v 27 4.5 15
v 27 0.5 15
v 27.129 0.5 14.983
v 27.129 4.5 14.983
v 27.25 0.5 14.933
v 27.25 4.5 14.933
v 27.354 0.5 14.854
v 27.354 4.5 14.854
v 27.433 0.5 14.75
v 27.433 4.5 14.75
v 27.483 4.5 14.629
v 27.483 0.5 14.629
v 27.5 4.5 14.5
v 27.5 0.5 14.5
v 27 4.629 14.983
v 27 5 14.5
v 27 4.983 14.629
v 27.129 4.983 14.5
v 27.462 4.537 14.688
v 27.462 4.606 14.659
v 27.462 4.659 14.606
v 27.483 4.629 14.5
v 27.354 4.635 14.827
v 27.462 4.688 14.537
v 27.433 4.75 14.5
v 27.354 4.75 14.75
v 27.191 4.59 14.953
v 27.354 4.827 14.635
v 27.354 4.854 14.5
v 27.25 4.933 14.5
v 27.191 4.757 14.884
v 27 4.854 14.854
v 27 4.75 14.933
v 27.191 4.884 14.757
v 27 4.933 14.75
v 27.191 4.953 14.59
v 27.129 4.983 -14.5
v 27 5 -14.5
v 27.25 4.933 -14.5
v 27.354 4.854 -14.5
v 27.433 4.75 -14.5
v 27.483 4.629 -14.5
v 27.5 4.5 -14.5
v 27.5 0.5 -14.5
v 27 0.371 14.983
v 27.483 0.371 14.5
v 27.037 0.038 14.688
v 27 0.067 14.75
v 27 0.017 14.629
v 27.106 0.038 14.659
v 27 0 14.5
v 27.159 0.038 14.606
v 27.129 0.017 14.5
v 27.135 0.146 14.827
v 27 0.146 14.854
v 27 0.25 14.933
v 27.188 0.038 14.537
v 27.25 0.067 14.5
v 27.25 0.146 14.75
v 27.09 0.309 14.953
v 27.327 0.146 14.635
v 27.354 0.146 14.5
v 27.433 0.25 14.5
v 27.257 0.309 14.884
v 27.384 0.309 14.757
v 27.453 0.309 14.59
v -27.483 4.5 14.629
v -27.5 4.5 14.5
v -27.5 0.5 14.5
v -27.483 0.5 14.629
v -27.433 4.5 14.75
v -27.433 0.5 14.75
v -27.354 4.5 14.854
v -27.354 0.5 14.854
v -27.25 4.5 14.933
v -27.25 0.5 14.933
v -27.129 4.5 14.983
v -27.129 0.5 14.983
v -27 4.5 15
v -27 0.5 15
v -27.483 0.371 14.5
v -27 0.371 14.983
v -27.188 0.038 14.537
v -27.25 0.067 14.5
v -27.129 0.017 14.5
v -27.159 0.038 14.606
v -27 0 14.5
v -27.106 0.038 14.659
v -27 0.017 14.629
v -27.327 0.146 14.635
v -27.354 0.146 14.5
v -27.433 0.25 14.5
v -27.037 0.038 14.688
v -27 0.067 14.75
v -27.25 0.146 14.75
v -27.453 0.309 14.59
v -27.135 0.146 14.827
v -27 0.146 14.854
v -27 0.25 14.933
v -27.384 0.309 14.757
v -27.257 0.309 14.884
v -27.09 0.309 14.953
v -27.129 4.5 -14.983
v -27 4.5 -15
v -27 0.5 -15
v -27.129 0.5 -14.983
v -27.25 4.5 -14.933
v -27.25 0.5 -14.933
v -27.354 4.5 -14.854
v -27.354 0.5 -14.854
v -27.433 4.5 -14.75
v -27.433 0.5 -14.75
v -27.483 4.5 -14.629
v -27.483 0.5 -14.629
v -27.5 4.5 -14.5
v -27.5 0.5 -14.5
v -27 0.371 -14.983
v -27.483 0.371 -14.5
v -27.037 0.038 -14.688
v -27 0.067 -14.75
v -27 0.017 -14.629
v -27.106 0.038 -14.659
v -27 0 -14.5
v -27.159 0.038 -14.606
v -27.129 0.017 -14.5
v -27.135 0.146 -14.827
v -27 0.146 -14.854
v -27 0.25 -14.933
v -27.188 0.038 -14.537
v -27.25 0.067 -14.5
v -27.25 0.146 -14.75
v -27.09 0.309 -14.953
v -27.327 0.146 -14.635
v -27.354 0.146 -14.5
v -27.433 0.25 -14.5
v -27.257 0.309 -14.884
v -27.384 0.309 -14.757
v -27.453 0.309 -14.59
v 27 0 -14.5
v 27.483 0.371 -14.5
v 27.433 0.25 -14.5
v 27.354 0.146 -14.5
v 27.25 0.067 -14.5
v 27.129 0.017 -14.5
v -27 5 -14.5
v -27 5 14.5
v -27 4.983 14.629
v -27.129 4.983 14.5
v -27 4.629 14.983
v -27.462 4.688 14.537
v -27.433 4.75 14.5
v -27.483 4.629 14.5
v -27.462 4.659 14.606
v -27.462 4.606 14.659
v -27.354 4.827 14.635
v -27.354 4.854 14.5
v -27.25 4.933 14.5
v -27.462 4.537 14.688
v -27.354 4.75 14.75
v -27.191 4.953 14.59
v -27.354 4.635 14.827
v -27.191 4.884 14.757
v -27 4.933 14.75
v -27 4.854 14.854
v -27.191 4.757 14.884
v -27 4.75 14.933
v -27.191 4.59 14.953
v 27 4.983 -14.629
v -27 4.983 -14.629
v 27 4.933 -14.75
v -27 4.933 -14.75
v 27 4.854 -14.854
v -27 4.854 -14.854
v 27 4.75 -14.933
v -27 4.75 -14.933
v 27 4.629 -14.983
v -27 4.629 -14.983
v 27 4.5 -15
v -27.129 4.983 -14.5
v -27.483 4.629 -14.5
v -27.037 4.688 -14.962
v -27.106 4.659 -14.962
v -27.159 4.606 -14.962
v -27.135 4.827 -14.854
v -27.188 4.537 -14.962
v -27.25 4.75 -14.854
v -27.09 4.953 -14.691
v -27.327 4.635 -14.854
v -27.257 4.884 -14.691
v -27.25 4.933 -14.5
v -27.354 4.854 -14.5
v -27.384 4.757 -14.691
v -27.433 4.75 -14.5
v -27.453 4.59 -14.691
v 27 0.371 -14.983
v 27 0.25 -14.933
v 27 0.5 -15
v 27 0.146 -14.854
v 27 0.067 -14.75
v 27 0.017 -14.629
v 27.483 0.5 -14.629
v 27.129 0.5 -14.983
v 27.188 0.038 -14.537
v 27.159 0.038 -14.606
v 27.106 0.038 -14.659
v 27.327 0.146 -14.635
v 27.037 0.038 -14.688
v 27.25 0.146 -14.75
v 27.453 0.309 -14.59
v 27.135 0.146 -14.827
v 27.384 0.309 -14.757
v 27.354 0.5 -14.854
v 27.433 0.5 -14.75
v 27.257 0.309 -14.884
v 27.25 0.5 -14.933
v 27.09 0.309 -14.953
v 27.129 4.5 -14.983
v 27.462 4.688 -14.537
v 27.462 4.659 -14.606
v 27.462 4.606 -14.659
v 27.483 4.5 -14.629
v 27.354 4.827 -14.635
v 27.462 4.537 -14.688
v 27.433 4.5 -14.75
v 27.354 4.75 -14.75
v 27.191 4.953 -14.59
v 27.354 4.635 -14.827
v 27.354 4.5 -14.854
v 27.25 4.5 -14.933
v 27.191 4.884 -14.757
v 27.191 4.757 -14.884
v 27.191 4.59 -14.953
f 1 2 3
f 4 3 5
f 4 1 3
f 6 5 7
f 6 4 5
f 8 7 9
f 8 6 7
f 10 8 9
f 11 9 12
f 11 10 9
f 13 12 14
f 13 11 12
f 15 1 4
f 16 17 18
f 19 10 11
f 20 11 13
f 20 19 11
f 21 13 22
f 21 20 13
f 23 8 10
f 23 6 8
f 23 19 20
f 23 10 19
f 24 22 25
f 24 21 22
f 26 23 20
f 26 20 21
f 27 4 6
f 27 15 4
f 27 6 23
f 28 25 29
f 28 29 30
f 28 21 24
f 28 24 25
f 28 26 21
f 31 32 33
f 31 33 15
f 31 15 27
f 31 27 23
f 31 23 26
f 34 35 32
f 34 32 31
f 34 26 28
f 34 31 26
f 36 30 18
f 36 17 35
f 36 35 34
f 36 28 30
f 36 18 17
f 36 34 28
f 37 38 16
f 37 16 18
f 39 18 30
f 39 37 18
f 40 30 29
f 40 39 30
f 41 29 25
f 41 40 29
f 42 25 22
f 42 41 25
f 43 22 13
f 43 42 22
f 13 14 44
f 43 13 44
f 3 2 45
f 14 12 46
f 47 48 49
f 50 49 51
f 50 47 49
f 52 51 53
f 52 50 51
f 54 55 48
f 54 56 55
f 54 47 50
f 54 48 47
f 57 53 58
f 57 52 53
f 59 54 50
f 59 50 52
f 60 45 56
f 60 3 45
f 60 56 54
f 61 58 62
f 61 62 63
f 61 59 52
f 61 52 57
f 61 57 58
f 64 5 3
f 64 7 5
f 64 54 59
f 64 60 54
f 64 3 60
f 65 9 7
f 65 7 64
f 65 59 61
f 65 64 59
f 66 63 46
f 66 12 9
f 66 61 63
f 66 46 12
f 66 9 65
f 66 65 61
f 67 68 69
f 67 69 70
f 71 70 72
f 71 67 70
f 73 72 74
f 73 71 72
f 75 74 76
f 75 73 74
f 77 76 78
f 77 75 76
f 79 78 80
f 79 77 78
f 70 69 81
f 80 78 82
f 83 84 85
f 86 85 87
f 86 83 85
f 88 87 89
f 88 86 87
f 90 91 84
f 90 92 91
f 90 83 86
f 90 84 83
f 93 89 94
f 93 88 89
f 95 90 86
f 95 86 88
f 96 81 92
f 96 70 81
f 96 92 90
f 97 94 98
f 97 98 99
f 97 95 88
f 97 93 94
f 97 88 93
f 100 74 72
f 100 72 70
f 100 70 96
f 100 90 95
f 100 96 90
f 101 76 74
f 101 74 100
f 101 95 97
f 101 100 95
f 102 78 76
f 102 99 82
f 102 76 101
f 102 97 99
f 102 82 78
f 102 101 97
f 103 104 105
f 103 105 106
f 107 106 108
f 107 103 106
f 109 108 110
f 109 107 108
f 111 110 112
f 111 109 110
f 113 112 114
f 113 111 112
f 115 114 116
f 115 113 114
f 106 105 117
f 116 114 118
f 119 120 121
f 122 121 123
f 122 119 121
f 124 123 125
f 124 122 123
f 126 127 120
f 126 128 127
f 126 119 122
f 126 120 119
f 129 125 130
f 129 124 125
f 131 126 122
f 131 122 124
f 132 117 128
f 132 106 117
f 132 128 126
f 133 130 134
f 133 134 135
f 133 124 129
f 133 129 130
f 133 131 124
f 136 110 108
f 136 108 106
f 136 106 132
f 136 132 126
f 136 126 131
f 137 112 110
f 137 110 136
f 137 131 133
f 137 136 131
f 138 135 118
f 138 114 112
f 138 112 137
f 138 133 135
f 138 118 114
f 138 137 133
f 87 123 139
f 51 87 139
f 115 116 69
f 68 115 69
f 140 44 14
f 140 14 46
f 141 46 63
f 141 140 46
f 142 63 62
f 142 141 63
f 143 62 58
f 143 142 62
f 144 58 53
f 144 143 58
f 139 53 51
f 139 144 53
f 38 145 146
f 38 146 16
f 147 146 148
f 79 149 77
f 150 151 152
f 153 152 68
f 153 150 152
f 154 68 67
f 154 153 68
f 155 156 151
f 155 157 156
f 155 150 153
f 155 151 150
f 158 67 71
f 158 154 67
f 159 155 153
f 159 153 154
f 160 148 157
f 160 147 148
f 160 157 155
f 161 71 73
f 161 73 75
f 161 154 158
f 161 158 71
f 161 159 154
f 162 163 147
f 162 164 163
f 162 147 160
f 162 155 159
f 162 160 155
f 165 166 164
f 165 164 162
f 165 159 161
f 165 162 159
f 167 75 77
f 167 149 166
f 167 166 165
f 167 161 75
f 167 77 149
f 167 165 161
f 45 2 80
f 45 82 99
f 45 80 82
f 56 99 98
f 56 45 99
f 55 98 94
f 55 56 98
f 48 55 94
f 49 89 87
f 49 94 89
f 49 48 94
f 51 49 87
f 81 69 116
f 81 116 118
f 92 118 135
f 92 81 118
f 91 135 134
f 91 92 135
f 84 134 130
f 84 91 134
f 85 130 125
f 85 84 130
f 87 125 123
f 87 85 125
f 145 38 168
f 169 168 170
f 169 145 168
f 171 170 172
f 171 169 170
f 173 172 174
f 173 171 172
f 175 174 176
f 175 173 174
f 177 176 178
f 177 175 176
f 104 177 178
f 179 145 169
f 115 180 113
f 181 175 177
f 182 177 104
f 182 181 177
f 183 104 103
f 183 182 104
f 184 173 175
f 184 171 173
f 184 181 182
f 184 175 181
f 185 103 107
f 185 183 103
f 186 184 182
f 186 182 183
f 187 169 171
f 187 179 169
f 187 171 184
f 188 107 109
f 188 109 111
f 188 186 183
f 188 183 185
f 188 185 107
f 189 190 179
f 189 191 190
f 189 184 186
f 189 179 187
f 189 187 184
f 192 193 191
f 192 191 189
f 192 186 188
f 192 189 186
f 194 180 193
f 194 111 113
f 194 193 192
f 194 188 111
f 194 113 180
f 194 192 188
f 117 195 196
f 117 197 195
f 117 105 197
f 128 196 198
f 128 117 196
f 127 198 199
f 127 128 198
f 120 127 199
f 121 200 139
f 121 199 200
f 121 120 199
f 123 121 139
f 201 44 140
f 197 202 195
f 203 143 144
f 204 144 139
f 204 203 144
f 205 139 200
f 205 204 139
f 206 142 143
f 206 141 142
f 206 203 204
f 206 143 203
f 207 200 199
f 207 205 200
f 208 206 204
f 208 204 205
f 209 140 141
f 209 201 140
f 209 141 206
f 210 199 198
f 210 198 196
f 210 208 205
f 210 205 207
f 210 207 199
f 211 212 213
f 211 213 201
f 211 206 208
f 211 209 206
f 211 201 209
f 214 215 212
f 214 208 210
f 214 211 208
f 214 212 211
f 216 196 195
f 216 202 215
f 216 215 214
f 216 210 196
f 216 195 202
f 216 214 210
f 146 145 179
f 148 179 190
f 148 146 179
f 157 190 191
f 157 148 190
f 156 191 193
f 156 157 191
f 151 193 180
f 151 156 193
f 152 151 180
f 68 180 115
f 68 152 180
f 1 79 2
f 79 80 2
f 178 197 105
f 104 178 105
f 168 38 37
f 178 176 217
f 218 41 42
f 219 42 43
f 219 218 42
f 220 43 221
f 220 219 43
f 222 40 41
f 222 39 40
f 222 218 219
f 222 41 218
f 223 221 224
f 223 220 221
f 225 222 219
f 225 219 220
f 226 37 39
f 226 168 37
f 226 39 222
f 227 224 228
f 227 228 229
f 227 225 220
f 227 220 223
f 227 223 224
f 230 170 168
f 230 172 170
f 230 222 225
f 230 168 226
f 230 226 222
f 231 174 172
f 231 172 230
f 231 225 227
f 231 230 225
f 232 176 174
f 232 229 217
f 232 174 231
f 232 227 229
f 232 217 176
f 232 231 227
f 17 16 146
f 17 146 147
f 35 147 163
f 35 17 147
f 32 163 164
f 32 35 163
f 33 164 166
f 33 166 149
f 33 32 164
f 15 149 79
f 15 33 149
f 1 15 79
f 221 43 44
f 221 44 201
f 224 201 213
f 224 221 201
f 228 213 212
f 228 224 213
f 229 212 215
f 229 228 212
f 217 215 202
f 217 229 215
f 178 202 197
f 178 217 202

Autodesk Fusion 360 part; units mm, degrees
sketch "Sketch1" plane through (0, 0, 0) normal (0, 1, 0) x (1, 0, 0)
  line L0 (27.5, 15) -> (-27.5, 15)
  line L1 (-27.5, 15) -> (-27.5, -15)
  line L2 (-27.5, -15) -> (27.5, -15)
  line L3 (27.5, -15) -> (27.5, 15)
  line L4 (27.5, 15) -> (-27.5, -15) construction
  line L5 (-27.5, 15) -> (27.5, -15) construction
  dimension "d1" = 55
  dimension "d2" = 30
extrude "Extrude1" add sketch "Sketch1" along normal blind 5
fillet "Fillet1" radius 0.5 12 edges at (0, 5, 15) (-27.5, 5, 0) (0, 5, -15) (27.5, 5, 0) (27.5, 2.5, -15) (27.5, 2.5, 15) (-27.5, 2.5, 15) (-27.5, 2.5, -15) (0, 0, 15) (-27.5, 0, 0) (0, 0, -15) (27.5, 0, 0)
